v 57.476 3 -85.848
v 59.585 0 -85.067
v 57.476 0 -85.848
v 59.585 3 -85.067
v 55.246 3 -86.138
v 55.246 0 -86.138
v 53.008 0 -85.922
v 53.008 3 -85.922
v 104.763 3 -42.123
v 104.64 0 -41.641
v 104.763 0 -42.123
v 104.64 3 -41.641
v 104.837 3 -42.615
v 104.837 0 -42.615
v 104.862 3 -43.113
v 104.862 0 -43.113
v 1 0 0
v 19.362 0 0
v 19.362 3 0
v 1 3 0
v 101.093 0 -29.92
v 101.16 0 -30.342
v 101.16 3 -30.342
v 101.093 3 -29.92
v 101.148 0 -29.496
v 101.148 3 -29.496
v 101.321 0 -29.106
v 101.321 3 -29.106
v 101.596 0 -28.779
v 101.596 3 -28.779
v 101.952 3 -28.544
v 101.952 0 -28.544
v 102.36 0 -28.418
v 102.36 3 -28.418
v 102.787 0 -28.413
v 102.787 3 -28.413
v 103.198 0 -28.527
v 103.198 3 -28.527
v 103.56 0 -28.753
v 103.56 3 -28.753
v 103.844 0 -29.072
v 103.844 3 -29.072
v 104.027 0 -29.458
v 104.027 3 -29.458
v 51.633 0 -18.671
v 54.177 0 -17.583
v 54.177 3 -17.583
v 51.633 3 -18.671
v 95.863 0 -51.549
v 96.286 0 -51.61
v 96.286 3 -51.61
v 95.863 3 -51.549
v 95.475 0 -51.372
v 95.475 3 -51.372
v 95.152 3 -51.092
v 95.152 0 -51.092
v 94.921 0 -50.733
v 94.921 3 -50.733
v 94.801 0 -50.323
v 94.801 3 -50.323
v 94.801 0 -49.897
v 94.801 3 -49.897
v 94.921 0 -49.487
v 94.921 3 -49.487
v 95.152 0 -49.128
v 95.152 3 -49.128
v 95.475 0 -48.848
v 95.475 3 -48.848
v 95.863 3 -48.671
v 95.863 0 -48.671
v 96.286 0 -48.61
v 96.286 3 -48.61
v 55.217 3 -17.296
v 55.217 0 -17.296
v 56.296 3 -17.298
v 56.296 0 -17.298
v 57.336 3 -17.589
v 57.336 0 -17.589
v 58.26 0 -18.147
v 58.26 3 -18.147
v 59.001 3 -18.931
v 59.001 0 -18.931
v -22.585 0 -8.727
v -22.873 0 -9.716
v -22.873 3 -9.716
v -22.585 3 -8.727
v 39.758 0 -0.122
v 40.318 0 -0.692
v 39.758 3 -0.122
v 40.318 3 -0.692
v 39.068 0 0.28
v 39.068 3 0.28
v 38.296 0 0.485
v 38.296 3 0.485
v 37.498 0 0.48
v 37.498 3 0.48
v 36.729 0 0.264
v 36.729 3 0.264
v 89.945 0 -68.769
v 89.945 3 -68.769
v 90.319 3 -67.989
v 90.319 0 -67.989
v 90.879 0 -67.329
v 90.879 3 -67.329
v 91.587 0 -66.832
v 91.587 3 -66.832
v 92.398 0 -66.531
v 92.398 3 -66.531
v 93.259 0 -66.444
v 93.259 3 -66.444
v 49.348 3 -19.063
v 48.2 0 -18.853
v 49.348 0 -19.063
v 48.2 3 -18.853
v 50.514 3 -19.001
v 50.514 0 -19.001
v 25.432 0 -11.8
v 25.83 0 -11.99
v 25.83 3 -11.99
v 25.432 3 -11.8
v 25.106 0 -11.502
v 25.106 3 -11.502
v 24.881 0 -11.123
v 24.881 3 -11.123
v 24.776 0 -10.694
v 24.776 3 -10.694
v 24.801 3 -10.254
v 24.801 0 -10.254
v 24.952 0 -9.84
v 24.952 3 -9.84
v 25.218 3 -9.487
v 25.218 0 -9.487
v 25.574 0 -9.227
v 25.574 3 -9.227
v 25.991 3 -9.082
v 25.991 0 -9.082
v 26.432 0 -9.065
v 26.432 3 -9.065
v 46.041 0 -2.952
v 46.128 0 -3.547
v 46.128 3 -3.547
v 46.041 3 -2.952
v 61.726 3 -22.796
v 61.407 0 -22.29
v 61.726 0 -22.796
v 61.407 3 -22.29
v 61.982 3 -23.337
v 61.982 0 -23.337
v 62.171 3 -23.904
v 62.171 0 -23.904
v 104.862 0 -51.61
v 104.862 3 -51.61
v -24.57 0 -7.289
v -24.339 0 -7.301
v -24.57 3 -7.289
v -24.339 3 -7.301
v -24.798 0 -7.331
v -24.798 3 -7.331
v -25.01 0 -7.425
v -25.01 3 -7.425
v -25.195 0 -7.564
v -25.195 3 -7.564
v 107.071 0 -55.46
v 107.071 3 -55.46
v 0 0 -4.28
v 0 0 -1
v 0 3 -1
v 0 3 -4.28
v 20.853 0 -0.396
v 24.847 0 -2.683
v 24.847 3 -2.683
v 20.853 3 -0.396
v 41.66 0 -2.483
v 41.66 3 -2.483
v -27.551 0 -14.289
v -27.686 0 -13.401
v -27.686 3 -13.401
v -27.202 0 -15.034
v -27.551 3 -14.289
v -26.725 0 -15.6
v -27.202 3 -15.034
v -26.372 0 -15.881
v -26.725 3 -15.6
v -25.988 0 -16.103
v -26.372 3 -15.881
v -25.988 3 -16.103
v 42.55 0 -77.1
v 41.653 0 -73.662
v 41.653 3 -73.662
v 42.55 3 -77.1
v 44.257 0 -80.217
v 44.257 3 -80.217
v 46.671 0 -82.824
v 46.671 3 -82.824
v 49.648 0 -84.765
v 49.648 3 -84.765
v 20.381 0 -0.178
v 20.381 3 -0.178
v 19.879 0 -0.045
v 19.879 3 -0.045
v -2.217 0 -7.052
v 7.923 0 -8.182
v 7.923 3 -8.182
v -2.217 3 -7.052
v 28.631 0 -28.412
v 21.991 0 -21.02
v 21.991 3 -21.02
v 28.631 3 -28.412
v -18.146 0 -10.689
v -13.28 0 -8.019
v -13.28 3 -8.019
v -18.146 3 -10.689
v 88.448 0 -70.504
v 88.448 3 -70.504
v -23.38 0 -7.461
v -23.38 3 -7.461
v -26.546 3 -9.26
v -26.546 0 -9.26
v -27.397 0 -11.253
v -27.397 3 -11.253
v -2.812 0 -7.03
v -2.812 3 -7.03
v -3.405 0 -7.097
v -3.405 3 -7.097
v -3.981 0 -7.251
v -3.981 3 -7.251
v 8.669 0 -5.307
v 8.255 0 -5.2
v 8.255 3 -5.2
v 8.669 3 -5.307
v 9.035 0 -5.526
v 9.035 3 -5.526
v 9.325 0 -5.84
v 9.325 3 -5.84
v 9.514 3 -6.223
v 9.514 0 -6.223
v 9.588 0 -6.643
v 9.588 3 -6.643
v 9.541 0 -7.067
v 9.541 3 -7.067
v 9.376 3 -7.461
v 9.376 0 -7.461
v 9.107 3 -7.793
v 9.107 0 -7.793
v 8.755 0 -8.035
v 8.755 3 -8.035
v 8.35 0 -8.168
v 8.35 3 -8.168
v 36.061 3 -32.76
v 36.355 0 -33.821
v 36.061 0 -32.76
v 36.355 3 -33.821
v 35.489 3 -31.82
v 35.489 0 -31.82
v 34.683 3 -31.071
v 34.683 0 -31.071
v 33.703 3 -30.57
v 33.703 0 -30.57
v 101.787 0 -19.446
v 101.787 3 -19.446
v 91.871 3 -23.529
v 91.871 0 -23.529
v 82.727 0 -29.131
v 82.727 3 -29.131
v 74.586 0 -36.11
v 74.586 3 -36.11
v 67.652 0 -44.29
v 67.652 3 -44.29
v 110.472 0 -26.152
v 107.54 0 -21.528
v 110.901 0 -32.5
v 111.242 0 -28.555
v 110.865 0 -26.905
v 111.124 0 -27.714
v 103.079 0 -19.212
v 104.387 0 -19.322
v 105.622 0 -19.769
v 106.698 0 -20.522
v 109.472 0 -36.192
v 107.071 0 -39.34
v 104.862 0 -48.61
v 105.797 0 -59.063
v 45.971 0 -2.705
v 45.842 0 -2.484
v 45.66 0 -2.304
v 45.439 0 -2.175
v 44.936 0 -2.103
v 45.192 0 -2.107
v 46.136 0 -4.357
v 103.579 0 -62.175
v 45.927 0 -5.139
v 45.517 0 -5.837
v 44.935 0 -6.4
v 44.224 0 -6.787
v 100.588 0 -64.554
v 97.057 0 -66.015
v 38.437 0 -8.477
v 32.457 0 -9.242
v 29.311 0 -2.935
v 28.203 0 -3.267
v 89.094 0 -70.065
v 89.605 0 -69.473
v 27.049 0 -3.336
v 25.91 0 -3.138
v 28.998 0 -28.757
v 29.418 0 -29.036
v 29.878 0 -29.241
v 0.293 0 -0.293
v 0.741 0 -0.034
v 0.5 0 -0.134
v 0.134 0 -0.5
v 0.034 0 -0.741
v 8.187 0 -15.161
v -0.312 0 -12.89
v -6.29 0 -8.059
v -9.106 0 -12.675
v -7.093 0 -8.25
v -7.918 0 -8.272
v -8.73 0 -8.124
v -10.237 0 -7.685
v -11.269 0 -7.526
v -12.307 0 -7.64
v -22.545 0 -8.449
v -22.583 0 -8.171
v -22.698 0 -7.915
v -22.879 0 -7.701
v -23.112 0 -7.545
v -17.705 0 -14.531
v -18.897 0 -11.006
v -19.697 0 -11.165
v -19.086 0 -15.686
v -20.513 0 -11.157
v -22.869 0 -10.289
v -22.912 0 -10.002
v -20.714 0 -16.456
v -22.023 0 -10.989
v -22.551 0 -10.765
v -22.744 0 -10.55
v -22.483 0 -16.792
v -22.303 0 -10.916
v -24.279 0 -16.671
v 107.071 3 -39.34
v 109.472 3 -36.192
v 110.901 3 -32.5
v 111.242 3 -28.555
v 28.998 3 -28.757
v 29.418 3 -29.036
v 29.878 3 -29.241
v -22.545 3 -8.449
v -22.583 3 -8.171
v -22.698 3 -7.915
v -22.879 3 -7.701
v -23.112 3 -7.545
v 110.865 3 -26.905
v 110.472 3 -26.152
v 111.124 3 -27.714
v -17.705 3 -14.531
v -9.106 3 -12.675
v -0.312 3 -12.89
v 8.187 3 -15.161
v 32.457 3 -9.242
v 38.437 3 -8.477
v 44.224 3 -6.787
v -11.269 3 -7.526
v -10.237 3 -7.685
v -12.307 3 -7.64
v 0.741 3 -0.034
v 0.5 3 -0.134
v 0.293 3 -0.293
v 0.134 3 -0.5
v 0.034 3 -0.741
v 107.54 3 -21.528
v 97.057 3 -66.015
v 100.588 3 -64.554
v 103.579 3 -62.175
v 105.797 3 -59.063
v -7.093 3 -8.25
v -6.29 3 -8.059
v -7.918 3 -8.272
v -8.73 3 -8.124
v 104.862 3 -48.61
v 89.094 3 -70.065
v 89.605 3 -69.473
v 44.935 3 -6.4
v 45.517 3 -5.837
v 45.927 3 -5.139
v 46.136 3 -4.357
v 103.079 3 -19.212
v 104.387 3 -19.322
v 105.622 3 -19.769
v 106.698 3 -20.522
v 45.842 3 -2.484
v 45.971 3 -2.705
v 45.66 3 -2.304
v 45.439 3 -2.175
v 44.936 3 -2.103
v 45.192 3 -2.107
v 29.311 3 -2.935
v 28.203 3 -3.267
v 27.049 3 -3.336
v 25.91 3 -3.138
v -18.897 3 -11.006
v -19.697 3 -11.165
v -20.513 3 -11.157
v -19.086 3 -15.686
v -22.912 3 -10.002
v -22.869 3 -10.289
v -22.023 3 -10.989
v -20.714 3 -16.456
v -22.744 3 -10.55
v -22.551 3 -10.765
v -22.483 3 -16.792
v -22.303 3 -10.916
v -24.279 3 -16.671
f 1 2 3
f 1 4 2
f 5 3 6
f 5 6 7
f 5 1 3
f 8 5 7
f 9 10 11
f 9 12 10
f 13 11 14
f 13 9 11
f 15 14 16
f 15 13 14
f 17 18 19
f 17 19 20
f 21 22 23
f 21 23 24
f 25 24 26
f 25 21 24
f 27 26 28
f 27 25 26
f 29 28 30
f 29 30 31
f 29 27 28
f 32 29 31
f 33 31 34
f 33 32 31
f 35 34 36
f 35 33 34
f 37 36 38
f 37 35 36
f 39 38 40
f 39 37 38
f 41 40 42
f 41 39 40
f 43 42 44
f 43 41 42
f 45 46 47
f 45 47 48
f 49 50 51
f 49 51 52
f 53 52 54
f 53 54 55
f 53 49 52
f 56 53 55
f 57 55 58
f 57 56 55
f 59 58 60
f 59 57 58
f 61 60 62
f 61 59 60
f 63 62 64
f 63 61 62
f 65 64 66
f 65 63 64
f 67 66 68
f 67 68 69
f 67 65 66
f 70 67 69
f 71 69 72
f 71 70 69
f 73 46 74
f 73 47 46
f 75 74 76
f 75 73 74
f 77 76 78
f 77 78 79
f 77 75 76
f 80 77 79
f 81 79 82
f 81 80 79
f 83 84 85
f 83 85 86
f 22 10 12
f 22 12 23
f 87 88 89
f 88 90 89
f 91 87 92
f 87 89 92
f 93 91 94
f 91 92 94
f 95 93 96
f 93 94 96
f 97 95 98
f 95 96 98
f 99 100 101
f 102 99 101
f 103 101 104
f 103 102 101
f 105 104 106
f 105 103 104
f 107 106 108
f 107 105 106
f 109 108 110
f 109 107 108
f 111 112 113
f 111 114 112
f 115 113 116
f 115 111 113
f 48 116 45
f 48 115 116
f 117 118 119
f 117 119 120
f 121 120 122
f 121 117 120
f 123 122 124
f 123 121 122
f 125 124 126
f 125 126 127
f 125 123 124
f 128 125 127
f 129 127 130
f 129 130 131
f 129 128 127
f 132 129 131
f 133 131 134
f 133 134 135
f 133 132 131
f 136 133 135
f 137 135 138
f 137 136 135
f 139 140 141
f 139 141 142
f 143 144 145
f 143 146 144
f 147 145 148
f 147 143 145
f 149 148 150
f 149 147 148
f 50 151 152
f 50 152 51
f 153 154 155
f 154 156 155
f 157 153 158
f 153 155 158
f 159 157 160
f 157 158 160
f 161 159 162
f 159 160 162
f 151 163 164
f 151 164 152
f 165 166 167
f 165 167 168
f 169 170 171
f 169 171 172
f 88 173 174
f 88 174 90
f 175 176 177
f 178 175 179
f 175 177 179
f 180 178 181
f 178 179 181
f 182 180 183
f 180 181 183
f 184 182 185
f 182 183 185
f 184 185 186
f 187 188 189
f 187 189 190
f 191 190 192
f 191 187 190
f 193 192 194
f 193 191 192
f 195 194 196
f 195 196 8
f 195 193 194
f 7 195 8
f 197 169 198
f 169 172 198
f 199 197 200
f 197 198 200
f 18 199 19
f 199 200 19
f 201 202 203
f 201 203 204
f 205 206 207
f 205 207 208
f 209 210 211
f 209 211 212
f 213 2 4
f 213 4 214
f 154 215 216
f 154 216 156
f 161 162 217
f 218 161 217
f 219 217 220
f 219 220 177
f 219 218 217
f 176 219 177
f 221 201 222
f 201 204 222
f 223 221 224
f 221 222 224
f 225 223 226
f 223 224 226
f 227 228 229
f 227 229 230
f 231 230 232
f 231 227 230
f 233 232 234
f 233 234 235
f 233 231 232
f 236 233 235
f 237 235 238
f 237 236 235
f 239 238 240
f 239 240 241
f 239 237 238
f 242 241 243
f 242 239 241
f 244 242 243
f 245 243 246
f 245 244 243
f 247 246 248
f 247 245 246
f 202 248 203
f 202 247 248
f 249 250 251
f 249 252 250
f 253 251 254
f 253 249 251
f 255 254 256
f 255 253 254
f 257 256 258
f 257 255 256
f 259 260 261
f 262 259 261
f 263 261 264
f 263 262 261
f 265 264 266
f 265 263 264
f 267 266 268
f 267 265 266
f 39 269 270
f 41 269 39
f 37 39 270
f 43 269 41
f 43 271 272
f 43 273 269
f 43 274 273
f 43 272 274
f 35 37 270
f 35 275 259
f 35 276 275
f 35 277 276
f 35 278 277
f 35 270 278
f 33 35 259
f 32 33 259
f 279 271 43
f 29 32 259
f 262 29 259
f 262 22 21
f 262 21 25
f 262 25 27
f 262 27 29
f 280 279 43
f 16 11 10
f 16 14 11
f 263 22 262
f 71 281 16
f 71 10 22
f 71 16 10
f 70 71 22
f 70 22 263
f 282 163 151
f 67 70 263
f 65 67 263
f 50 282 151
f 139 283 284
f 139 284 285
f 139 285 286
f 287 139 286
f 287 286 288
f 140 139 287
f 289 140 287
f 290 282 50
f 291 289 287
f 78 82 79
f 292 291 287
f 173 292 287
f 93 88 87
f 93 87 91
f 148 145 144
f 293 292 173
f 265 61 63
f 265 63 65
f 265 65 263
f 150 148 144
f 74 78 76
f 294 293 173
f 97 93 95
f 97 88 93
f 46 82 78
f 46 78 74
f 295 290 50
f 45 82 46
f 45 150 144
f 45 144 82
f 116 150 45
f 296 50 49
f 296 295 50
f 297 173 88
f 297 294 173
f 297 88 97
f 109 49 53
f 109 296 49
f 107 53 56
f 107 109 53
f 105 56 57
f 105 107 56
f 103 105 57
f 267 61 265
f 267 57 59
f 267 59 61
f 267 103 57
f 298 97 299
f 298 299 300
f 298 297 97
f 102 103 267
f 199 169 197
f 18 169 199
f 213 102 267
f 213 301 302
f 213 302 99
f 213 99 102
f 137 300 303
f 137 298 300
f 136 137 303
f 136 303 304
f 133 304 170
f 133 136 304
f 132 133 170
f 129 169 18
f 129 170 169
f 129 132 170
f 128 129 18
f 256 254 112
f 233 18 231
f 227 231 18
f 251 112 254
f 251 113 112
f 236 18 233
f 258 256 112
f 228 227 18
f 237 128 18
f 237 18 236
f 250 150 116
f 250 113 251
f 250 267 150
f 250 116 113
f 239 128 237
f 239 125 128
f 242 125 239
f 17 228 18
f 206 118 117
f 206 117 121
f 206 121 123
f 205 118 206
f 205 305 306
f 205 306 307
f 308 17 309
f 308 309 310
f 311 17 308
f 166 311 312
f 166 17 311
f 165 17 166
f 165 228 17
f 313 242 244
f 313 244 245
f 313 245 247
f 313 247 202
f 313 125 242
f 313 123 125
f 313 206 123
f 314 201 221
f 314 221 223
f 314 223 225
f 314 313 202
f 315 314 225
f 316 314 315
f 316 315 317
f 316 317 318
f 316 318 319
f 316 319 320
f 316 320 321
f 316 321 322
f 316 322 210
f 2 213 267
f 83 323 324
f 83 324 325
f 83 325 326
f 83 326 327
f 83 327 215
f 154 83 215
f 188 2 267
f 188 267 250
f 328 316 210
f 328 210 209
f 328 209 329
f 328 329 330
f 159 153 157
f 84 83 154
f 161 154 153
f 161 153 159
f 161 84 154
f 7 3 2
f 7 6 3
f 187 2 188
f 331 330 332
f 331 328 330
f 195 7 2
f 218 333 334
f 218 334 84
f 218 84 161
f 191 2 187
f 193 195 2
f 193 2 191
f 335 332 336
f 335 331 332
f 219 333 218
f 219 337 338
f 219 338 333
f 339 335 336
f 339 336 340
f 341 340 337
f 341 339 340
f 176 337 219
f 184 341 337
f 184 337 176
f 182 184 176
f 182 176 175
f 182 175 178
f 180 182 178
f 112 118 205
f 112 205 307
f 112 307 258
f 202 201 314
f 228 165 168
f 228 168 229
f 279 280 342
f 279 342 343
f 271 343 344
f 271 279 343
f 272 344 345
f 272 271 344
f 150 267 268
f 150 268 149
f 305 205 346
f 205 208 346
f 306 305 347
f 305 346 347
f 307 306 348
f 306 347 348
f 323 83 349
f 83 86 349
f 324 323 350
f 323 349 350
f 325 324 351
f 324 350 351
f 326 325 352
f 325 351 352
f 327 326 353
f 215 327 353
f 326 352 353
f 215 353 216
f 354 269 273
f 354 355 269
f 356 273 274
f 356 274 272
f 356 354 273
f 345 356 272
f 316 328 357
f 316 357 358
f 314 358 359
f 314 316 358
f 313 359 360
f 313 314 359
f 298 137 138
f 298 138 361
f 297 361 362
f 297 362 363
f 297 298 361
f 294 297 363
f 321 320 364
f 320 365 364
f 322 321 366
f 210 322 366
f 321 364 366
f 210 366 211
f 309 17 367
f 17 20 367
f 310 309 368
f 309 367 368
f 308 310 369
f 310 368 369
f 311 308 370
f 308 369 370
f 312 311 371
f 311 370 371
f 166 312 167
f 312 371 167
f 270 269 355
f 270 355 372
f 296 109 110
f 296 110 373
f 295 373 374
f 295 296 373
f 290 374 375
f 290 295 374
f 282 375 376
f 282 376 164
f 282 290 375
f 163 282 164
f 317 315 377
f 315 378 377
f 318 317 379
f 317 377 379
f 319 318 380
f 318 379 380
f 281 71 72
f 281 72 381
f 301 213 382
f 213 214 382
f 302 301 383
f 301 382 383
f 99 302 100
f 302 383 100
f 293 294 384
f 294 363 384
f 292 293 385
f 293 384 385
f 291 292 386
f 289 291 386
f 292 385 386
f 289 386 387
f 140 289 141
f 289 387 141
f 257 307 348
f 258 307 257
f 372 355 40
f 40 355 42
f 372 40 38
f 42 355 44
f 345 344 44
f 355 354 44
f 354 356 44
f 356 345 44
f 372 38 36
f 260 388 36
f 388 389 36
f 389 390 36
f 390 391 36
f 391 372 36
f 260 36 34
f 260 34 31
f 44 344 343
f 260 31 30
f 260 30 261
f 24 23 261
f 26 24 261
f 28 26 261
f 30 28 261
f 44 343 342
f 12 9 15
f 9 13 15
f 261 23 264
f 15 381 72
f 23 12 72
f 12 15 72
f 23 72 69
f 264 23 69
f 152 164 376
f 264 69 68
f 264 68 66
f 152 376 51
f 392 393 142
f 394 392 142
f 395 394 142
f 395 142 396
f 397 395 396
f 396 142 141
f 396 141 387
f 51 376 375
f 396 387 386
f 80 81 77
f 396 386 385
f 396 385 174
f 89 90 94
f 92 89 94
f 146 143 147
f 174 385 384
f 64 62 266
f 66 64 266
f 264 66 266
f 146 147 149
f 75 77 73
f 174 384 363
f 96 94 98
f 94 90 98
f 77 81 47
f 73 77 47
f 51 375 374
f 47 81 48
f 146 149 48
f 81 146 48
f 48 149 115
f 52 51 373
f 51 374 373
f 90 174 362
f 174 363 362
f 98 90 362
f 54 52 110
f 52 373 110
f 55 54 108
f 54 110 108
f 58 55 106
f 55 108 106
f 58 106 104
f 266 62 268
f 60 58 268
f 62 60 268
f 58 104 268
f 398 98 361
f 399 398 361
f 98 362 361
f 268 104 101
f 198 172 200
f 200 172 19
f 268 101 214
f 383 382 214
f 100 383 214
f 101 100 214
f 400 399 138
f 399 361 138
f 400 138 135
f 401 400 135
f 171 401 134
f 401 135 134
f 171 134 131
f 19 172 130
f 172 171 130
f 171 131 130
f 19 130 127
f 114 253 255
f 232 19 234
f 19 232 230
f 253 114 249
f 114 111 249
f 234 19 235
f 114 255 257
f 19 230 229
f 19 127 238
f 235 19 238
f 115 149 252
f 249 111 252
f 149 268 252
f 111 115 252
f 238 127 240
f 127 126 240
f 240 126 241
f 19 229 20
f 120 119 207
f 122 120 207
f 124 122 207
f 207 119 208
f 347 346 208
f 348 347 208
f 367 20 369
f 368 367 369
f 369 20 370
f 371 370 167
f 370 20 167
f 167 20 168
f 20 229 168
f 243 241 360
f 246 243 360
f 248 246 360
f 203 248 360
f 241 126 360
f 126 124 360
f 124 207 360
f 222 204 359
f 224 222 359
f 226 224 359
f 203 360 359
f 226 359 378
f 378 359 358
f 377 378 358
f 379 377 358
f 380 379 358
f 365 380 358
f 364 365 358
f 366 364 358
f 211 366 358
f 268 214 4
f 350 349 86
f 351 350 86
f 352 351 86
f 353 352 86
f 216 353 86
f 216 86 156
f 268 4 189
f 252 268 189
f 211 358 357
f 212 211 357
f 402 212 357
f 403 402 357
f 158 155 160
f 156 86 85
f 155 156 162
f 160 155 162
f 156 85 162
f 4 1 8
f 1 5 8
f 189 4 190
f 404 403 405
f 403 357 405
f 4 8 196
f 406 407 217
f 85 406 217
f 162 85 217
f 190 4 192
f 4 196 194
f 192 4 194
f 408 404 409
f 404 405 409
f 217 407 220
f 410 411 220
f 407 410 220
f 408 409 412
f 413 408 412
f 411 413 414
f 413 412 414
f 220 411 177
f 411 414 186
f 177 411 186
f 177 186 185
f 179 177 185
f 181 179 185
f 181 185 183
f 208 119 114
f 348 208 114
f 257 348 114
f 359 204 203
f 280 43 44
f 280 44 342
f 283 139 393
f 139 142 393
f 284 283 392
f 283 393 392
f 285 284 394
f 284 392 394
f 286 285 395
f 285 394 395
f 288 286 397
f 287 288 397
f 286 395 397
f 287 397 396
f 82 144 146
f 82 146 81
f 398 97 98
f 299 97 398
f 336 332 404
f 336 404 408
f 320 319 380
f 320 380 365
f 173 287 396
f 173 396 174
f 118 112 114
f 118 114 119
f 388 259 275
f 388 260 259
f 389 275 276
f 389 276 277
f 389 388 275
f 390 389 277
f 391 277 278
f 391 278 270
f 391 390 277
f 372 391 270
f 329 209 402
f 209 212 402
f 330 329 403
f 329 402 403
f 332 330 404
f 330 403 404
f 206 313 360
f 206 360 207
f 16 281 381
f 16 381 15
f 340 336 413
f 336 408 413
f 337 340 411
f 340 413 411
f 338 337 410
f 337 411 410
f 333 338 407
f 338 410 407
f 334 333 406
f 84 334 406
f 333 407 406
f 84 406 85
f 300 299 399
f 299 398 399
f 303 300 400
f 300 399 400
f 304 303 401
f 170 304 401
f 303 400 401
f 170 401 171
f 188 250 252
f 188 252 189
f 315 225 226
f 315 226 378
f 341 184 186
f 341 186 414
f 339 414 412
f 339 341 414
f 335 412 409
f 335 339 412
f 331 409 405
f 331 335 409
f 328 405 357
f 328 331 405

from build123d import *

# Parameters (mm, degrees)
BOSS_EXTRUDE1_DEPTH = 3
FILLET1_R           = 3
FILLET2_R           = 5
FILLET3_R           = 4
FILLET4_R           = 1
FILLET5_R           = 10


with BuildPart() as part:
    # Sketch2 → Boss-Extrude1 (new body)
    with BuildSketch(Plane(origin=(0, 0, 0), x_dir=(1, 0, 0), z_dir=(0, 1, 0))):
        with BuildLine():
            Line((104.861742338, 51.61), (96.285742338, 51.61))
            ThreePointArc((96.285742338, 51.61), (94.785742338, 50.11), (96.285742338, 48.61))
            Line((96.285742338, 48.61), (104.861742338, 48.61))
            Line((104.861742338, 48.61), (104.861742338, 42.36))
            Line((104.861742338, 42.36), (101.159535482, 30.341590159))
            ThreePointArc((101.159535482, 30.341590159), (102.15147179, 28.466473533), (104.026588416, 29.458409841))
            Line((104.026588416, 29.458409841), (107.0705594, 39.34))
            ThreePointArc((107.0705594, 39.34), (110.559148386, 33.719570051), (111.09, 27.125809175))
            Line((111.09, 27.125809175), (105.531161353, 18.360668643))
            ThreePointArc((105.531161353, 18.360668643), (84.319857644, 28.006827284), (67.651742338, 44.29))
            Line((67.651742338, 44.29), (61.935762488, 23.027584397))
            Line((61.935762488, 23.027584397), (57.13, 16.32))
            Line((57.13, 16.32), (49.95, 19.39))
            Line((49.95, 19.39), (25.830040494, 11.99))
            ThreePointArc((25.830040494, 11.99), (24.800734775, 10.253880031), (26.431506195, 9.064692331))
            ThreePointArc((26.431506195, 9.064692331), (36.664028635, 8.803570476), (46.46571567, 5.854056721))
            Line((46.46571567, 5.854056721), (45.9, 1.991540554))
            Line((45.9, 1.991540554), (41.660045255, 2.482673431))
            Line((41.660045255, 2.482673431), (38.9, -1.2))
            Line((38.9, -1.2), (27.015518097, 3.924692331))
            Line((27.015518097, 3.924692331), (20.16, 0))
            Line((20.16, 0), (0, 0))
            Line((0, 0), (0, 4.28))
            Line((0, 4.28), (8.255364291, 5.2))
            ThreePointArc((8.255364291, 5.2), (9.58, 6.856906829), (7.923093171, 8.181542538))
            Line((7.923093171, 8.181542538), (-3.121398875, 6.950714639))
            Line((-3.121398875, 6.950714639), (-7.499203077, 8.482641989))
            Line((-7.499203077, 8.482641989), (-11.827625236, 7.22158903))
            Line((-11.827625236, 7.22158903), (-19.255161489, 11.297641869))
            Line((-19.255161489, 11.297641869), (-23.205269456, 10.857431213))
            Line((-23.205269456, 10.857431213), (-22.269740859, 7.646334739))
            Line((-22.269740859, 7.646334739), (-24.812537217, 7.22158903))
            ThreePointArc((-24.812537217, 7.22158903), (-27.256062178, 10.796585791), (-27.5, 15.12))
            ThreePointArc((-27.5, 15.12), (-22.484233626, 16.792009689), (-17.704912147, 14.531121607))
            ThreePointArc((-17.704912147, 14.531121607), (-4.702395419, 12.521774189), (8.186937419, 15.161474421))
            Line((8.186937419, 15.161474421), (21.991482078, 21.019847276))
            Line((21.991482078, 21.019847276), (29.148159429, 28.986869108))
            Line((29.148159429, 28.986869108), (36.03, 31.378427725))
            Line((36.03, 31.378427725), (41.652863678, 73.662098134))
            ThreePointArc((41.652863678, 73.662098134), (47.001876481, 83.094401265), (57.4, 86.17))
            Line((57.4, 86.17), (89.772823478, 69.836247096))
            ThreePointArc((89.772823478, 69.836247096), (90.799785464, 67.40403524), (93.25912827, 66.443859006))
            ThreePointArc((93.25912827, 66.443859006), (102.166931279, 63.469413825), (107.0705594, 55.46))
            Line((107.0705594, 55.46), (104.861742338, 51.61))
        make_face()
    extrude(amount=BOSS_EXTRUDE1_DEPTH)

    # Fillet1
    fillet1_edges = [part.edges().sort_by_distance(p)[0] for p in [
        (46.46571567, 1.5, -5.854056721),
        (38.9, 1.5, 1.2),
        (20.16, 1.5, 0),
        (-27.5, 1.5, -15.12),
        (29.148159429, 1.5, -28.986869108),
        (89.772823478, 1.5, -69.836247096),
    ]]
    fillet(fillet1_edges, radius=FILLET1_R)

    # Fillet2
    fillet2_edges = [part.edges().sort_by_distance(p)[0] for p in [
        (104.861742338, 1.5, -42.36),
        (111.09, 1.5, -27.125809175),
        (105.531161353, 1.5, -18.360668643),
        (61.935762488, 1.5, -23.027584397),
        (49.95, 1.5, -19.39),
        (27.015518097, 1.5, -3.924692331),
    ]]
    fillet(fillet2_edges, radius=FILLET2_R)

    # Fillet3
    fillet3_edges = [part.edges().sort_by_distance(p)[0] for p in [
        (57.13, 1.5, -16.32),
        (-3.121398875, 1.5, -6.950714639),
        (-7.499203077, 1.5, -8.482641989),
        (-11.827625236, 1.5, -7.22158903),
        (-19.255161489, 1.5, -11.297641869),
        (36.03, 1.5, -31.378427725),
    ]]
    fillet(fillet3_edges, radius=FILLET3_R)

    # Fillet4
    fillet4_edges = [part.edges().sort_by_distance(p)[0] for p in [
        (45.9, 1.5, -1.991540554),
        (0, 1.5, 0),
        (-23.205269456, 1.5, -10.857431213),
        (-22.269740859, 1.5, -7.646334739),
        (-24.812537217, 1.5, -7.22158903),
    ]]
    fillet(fillet4_edges, radius=FILLET4_R)

    # Fillet5
    fillet5_edges = [part.edges().sort_by_distance(p)[0] for p in [
        (57.4, 1.5, -86.17),
    ]]
    fillet(fillet5_edges, radius=FILLET5_R)


solid = part.part
